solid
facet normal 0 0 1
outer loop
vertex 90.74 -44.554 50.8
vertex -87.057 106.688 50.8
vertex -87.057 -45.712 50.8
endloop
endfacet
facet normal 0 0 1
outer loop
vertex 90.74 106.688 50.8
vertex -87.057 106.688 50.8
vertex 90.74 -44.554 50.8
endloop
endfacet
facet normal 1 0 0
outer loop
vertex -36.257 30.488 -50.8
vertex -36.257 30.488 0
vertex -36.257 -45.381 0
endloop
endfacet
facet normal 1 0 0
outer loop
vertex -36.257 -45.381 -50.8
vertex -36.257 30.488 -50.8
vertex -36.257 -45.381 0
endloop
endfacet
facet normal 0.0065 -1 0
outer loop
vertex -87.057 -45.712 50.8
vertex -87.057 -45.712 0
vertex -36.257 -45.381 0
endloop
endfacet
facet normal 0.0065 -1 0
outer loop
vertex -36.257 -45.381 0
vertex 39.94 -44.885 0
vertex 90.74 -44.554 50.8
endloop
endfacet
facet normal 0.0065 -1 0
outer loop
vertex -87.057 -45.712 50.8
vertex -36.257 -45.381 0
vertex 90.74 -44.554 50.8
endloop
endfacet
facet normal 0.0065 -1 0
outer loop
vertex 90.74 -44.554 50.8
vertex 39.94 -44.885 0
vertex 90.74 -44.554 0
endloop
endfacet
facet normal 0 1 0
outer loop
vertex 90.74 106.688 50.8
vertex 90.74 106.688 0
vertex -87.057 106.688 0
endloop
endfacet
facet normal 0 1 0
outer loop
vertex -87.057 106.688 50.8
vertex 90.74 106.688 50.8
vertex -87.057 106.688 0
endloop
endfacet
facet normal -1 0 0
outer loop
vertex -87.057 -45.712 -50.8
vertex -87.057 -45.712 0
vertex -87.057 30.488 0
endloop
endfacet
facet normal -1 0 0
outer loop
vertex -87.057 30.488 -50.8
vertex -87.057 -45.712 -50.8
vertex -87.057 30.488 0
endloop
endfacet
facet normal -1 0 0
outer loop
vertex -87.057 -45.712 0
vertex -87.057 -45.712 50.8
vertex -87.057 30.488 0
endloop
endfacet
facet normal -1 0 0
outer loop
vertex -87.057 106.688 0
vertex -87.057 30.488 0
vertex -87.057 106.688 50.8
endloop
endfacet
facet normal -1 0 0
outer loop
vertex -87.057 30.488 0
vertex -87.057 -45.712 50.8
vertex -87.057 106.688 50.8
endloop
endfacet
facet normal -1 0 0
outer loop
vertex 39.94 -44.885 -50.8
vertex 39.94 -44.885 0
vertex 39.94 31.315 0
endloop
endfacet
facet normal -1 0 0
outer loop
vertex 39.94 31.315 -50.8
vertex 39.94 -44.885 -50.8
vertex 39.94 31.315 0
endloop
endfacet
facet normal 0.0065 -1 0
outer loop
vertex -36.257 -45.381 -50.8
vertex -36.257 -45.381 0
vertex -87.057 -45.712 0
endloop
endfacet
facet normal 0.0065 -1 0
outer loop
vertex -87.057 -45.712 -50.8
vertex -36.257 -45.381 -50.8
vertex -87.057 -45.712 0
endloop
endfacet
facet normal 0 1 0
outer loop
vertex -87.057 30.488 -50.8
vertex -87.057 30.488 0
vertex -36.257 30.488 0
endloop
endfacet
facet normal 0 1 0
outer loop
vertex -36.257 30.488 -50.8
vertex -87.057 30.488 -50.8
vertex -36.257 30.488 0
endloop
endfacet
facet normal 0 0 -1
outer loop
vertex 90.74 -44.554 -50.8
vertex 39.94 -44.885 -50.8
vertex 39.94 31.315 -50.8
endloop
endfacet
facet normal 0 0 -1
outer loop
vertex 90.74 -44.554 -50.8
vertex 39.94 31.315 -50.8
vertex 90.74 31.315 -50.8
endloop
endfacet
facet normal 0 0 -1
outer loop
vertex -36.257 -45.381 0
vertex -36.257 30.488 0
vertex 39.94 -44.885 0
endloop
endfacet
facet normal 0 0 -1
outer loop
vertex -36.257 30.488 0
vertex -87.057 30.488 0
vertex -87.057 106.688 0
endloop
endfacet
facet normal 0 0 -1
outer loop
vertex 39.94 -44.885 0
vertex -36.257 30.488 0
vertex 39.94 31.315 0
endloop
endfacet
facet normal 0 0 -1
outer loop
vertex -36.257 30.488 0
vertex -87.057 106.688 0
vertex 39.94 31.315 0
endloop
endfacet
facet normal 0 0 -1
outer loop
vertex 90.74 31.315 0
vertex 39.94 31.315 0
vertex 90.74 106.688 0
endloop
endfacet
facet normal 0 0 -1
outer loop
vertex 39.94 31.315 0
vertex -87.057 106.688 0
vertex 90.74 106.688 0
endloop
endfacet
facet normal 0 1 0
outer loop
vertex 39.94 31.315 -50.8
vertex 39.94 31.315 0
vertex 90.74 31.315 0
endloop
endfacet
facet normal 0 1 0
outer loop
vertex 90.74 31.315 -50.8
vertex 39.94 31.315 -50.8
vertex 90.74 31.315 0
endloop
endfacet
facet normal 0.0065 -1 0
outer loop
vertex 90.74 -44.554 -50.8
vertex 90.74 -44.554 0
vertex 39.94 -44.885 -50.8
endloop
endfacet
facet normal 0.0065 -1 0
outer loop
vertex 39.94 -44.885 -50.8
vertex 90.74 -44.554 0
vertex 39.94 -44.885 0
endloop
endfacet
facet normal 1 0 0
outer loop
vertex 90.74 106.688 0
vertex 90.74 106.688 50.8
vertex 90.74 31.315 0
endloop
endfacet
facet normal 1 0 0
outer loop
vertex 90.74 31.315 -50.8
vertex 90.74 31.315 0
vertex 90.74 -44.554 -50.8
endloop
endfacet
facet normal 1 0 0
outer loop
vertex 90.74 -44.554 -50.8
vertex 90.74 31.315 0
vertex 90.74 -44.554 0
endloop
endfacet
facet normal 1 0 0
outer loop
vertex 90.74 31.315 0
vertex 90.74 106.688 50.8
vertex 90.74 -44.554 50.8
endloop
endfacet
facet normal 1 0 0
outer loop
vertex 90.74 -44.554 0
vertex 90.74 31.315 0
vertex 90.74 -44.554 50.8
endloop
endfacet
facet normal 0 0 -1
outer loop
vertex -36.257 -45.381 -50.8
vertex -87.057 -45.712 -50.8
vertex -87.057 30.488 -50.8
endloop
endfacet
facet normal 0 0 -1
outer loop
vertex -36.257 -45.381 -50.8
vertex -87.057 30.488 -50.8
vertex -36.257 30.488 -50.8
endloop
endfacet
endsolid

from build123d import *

# Parameters (mm, degrees)
F1_DEPTH = 50.8
F3_DEPTH = 50.8
F5_DEPTH = 50.8


with BuildPart() as f1:
    # F0 (on Top) → F1 (new body)
    with BuildSketch(Plane.XY):
        Polygon((-87.056688, 106.687943), (-87.056688, -45.712057), (90.739539, -44.553774), (90.739539, 106.687943), align=None)
    extrude(amount=F1_DEPTH)

    # F2 (on face) → F3 (join)
    with BuildSketch(Plane(origin=(0, 0, 0), x_dir=(1, 0, 0), z_dir=(0, 0, -1))):
        Polygon((-36.256688, 45.381112), (-87.056688, 45.712057), (-87.056688, -30.487943), (-36.256688, -30.487943), align=None)
    extrude(amount=F3_DEPTH)

    # F4 (on face) → F5 (join)
    with BuildSketch(Plane(origin=(0, 0, 0), x_dir=(1, 0, 0), z_dir=(0, 0, -1))):
        Polygon((90.739539, 44.553774), (39.939539, 44.884719), (39.939539, -31.315281), (90.739539, -31.315281), align=None)
    extrude(amount=F5_DEPTH)


solid = f1.part
